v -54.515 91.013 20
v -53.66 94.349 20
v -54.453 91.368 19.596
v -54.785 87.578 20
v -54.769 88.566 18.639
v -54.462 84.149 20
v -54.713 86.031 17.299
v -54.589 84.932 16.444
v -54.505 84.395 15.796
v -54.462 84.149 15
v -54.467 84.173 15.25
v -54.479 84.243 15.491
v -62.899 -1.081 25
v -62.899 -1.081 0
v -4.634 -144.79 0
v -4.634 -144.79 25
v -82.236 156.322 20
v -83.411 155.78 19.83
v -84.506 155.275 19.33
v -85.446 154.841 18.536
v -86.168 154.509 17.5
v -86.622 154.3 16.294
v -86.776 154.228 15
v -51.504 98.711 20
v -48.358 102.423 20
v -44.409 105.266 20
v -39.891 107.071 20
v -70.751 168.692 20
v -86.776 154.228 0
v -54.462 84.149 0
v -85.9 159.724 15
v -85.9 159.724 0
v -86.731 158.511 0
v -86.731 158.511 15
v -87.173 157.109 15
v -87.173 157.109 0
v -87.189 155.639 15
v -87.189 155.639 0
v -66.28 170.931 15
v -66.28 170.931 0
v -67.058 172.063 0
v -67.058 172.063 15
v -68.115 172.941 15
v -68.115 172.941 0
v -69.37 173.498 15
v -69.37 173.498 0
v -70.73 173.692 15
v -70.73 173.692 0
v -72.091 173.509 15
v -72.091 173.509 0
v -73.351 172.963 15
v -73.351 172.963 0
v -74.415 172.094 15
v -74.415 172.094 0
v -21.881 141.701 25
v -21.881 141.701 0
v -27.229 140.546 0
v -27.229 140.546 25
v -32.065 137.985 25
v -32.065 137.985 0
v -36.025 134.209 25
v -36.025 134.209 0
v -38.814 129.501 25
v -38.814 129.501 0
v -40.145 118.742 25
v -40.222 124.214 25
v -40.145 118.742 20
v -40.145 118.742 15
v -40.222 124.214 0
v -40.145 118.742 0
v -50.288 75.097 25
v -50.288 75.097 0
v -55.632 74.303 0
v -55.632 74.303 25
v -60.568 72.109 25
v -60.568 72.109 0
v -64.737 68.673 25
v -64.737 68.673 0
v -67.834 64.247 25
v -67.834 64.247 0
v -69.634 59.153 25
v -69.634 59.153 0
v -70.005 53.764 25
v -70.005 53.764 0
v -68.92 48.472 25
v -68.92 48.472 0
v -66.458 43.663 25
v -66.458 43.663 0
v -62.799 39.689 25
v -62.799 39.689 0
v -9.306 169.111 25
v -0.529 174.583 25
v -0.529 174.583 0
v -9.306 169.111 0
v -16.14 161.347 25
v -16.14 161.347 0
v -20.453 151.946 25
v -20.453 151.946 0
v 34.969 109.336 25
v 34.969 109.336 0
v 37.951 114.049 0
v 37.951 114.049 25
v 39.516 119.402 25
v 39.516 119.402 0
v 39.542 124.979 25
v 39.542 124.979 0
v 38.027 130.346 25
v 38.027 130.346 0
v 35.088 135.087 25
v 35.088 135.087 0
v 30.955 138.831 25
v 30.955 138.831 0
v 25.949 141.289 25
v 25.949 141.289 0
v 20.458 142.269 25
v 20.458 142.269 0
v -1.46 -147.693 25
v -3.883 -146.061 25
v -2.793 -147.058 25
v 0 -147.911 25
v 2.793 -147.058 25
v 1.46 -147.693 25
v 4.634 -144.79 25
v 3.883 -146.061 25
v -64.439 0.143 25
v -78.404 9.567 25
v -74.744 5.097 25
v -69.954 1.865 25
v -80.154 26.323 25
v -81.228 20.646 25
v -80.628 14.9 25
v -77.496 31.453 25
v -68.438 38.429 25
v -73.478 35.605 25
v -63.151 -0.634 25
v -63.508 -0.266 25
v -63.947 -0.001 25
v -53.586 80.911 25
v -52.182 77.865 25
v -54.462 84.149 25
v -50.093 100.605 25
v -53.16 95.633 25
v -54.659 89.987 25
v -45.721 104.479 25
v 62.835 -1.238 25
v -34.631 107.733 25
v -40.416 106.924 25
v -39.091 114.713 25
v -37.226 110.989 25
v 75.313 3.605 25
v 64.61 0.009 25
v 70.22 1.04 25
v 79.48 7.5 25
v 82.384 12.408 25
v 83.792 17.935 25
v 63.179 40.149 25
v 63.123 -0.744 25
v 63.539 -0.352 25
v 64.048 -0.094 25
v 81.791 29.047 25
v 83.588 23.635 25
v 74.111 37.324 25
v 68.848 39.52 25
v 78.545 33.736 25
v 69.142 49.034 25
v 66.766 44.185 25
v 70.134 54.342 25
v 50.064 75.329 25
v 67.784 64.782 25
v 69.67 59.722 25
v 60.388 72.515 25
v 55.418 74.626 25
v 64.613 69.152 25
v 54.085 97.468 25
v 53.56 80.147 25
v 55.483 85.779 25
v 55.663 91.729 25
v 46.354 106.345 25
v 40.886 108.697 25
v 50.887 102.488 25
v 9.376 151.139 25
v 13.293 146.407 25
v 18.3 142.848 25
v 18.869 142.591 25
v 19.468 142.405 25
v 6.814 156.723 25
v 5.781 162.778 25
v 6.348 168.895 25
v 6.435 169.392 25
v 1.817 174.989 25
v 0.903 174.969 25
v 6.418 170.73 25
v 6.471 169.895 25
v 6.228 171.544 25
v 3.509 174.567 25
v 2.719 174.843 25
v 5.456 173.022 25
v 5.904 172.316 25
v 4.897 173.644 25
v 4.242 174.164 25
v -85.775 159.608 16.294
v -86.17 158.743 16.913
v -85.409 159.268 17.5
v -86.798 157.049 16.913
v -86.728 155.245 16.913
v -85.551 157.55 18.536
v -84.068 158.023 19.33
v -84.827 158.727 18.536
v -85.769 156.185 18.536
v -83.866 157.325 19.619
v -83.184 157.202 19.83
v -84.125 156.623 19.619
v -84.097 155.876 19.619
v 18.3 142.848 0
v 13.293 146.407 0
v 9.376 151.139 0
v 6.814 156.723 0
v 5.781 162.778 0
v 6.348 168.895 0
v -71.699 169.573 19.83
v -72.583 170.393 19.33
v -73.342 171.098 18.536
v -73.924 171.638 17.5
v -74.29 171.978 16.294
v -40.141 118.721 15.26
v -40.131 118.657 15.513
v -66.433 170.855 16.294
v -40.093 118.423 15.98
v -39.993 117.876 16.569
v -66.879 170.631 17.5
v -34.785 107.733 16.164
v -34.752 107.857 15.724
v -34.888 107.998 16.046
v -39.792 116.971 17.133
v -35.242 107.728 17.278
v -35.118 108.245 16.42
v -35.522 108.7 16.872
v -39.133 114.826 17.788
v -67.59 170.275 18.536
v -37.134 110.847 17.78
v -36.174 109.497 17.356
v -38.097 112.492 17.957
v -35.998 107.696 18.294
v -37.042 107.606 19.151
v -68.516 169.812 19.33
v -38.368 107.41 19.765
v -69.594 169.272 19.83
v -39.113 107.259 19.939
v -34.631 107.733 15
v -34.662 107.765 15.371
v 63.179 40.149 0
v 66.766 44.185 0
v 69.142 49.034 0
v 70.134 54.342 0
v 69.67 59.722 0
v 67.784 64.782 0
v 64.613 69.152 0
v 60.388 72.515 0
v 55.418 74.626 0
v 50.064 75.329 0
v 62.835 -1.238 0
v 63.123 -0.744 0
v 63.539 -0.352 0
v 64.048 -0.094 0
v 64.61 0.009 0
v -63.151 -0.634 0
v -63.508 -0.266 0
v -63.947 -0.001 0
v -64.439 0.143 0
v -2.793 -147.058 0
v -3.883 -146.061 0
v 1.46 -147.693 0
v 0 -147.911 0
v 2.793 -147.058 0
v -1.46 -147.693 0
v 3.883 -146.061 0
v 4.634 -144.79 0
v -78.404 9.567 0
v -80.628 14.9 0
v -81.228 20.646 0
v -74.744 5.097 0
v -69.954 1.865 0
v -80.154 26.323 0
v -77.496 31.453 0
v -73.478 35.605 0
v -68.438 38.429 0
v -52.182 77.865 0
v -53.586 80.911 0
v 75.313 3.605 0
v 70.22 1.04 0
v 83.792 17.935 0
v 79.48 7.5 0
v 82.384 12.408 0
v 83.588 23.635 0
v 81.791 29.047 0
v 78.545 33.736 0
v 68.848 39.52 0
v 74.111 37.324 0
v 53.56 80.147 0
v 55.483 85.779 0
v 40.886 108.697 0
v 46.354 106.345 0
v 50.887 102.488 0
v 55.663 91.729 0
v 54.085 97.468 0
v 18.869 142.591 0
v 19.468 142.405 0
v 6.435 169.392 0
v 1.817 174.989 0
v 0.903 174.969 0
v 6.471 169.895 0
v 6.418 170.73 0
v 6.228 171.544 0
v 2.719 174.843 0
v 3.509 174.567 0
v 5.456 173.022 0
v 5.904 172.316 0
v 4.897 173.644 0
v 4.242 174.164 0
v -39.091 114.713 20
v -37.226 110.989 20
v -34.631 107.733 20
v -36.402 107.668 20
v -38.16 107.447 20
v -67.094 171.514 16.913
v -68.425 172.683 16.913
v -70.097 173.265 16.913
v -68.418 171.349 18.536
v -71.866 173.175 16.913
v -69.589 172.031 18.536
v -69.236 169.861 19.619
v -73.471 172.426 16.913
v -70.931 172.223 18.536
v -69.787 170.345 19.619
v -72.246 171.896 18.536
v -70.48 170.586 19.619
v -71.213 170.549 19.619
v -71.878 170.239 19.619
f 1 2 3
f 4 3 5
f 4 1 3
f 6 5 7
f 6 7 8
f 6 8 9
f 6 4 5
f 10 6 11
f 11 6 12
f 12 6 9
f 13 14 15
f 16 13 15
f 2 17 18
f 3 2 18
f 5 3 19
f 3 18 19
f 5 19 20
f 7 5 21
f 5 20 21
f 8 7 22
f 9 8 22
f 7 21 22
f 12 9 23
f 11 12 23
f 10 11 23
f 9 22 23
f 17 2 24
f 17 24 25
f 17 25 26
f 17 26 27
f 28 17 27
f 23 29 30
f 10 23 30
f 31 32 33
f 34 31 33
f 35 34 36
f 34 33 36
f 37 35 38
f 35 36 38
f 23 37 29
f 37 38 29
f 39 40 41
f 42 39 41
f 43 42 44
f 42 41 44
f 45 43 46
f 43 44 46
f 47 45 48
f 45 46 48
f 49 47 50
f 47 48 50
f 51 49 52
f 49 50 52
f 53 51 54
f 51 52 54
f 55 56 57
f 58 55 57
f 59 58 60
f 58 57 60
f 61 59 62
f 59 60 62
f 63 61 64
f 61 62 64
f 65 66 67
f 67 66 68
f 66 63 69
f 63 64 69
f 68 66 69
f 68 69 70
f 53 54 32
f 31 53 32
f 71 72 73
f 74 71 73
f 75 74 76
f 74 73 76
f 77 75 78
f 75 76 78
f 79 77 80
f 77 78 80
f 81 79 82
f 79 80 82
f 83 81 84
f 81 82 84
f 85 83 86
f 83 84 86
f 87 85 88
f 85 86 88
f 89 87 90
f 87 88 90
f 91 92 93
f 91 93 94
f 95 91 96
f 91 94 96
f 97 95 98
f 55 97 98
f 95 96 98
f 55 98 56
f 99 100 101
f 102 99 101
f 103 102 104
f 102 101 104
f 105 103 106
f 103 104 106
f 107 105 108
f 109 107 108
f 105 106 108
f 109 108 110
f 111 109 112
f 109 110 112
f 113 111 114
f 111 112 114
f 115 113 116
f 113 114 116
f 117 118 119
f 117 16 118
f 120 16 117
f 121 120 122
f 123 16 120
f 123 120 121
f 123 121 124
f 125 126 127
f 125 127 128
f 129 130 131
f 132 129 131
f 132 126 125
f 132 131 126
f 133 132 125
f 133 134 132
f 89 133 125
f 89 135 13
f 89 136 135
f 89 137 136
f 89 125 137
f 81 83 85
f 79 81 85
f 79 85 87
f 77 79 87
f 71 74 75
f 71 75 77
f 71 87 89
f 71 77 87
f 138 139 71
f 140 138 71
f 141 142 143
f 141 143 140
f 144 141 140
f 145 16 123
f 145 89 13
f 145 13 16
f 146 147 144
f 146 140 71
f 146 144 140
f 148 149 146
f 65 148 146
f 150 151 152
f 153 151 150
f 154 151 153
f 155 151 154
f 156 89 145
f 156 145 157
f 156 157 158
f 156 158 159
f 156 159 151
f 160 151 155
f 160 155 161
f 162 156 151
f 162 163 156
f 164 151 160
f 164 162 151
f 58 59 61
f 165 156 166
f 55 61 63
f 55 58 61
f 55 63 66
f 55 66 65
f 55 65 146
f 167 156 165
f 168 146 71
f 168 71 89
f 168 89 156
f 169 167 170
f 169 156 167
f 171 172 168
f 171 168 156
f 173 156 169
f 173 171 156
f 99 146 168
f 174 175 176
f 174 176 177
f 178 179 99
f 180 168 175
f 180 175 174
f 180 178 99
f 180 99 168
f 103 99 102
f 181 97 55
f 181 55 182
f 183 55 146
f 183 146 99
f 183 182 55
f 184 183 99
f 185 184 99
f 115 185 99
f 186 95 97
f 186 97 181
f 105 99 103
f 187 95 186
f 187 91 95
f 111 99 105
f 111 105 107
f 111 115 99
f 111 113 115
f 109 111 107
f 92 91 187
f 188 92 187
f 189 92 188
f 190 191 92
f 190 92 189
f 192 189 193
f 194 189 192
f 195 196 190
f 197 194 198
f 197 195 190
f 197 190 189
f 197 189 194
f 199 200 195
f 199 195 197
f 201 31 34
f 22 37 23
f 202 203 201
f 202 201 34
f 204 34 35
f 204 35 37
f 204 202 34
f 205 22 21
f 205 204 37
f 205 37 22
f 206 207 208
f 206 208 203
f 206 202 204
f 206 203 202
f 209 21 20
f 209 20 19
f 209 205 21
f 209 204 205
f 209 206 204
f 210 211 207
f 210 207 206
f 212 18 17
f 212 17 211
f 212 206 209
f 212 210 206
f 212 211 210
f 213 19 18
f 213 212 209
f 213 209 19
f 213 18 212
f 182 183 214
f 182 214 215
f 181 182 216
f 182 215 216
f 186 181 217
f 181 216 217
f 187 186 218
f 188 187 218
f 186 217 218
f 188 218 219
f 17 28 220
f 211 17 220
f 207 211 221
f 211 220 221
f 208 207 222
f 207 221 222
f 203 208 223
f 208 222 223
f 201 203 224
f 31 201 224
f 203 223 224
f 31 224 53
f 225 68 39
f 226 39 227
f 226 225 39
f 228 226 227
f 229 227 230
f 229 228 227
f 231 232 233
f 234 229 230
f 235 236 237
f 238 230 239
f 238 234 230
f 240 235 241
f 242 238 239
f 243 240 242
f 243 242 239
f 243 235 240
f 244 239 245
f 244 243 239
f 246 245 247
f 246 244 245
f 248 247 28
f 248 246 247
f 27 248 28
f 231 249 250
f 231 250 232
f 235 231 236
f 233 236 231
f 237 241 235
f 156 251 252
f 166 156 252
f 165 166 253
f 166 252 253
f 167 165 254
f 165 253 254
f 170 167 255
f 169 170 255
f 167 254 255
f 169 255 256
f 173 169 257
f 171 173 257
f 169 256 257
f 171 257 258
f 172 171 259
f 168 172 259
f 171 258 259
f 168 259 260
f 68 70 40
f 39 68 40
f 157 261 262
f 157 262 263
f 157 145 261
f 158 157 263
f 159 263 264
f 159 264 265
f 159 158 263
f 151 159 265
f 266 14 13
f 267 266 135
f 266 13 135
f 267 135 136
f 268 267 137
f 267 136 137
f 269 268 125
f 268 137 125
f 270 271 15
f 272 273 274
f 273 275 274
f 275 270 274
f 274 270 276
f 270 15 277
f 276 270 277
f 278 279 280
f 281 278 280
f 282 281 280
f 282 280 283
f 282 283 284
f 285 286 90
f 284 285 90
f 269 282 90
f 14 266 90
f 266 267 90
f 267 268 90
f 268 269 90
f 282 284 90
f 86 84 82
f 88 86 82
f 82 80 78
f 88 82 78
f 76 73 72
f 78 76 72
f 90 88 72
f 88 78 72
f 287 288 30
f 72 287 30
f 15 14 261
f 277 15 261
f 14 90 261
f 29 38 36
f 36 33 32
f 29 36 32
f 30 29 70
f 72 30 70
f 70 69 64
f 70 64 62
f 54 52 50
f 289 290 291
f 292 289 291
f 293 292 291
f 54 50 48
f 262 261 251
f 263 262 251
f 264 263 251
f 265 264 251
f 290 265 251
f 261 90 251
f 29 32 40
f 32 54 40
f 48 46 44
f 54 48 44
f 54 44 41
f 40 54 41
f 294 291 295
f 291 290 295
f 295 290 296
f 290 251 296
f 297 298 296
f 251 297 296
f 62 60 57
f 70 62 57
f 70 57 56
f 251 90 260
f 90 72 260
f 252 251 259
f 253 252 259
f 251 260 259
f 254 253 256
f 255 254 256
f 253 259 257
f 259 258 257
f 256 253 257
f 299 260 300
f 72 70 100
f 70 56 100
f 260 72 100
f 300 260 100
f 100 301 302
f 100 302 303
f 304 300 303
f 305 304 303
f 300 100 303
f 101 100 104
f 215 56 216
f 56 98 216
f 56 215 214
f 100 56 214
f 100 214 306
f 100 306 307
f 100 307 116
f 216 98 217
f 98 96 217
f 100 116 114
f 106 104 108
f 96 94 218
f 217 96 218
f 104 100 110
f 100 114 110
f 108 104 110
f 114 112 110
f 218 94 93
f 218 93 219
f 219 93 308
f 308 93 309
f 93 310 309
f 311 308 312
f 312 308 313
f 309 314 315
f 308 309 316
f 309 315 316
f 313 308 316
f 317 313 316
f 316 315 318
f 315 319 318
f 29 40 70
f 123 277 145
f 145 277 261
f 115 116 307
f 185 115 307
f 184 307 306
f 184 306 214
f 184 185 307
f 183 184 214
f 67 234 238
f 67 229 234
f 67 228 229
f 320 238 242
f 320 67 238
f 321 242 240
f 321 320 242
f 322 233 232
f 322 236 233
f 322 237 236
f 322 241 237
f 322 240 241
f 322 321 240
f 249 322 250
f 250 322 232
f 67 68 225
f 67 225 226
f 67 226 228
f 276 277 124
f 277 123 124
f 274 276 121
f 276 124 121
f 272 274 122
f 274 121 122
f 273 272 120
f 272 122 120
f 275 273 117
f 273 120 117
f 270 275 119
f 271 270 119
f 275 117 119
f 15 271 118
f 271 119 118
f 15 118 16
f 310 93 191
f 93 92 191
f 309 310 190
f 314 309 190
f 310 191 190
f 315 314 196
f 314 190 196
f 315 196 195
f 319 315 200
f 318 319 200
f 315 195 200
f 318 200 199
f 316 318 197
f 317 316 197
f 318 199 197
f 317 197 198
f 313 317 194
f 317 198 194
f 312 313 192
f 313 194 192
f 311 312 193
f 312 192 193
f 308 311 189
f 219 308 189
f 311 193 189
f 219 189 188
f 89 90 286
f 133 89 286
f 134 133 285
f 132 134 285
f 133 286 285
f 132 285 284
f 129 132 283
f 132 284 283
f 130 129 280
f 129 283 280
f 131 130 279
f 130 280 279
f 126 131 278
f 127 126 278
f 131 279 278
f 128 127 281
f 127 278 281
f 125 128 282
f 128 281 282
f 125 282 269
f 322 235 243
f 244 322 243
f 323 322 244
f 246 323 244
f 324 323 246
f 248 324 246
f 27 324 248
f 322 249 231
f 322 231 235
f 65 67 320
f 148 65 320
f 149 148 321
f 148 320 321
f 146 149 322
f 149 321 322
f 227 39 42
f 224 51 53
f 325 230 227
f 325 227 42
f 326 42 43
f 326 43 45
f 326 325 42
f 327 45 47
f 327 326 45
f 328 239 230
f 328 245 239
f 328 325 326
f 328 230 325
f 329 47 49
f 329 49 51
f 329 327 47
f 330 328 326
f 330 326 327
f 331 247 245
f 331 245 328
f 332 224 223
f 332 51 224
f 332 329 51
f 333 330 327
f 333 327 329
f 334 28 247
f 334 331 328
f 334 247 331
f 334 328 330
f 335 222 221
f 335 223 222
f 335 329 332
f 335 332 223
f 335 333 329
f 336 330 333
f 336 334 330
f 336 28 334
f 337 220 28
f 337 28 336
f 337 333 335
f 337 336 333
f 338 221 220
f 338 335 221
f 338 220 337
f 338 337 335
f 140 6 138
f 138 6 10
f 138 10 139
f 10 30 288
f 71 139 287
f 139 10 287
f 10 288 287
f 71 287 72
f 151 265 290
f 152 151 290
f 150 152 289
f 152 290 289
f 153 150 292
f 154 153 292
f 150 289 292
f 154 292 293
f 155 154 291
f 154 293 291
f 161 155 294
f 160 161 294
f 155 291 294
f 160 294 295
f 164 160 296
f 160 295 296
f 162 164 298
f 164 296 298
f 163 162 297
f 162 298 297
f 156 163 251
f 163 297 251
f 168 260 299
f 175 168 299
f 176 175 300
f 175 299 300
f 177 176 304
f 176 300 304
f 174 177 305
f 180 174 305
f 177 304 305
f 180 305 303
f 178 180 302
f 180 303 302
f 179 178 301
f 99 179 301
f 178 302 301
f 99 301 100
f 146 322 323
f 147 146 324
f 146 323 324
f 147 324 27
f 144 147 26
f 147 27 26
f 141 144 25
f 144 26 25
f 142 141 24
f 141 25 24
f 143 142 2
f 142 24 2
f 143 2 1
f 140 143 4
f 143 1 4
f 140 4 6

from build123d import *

# Parameters (mm, degrees)
F1_DEPTH     = 25
F2_R         = 5
F3_R         = 5
F4_R         = 2
F6_R         = 5
F7_DEPTH     = 20
F8_T1_DEPTH  = 16.879655815
F8_T3_DEPTH  = 23.3726224193
F8_T5_DEPTH  = 33.0268060681
F8_T10_DEPTH = 5.1
F8_T16_DEPTH = 5.1
F8_T22_DEPTH = 98.4210661838
F8_S23_R     = 20
F8_T24_DEPTH = 53
F8_S25_R     = 20
F8_T26_DEPTH = 53
F8_T30_DEPTH = 70.867251183
F8_S31_R     = 20
F8_T32_DEPTH = 39
F8_S33_R     = 20
F8_T34_DEPTH = 39


# Not quite as in the source:
# - a fillet or chamfer that OpenCascade refuses, or shapes differently, is made with other operations: its cross-section is extruded or revolved along the edge and cut away or added
# - two fillets or chamfers of one size are made in one step


with BuildPart() as f1:
    # F0 (on Top) → F1 (new body)
    with BuildSketch(Plane.XY):
        with BuildLine():
            ThreePointArc((-62.7989065684, 39.6886658546), (-81.243248627, 20.090620438), (-63.3367104763, 0))
            Line((-63.3367104763, 0), (0, -156.2183324342))
            Line((0, -156.2183324342), (63.3367104763, 0))
            ThreePointArc((63.3367104763, 0), (83.9060549488, 20.1553189736), (63.1791622356, 40.1485861756))
            ThreePointArc((63.1791622356, 40.1485861756), (68.8985621757, 62.3156526678), (50.0641206725, 75.3292680691))
            ThreePointArc((50.0641206725, 75.3292680691), (54.0847867027, 97.4676528526), (34.9687938538, 109.335788913))
            ThreePointArc((34.9687938538, 109.335788913), (37.8165399559, 130.8078112166), (19.4443891765, 142.2804515145))
            ThreePointArc((19.4443891765, 142.2804515145), (6.5496116272, 157.6455026462), (10.1508991793, 177.3784905672))
            ThreePointArc((10.1508991793, 177.3784905672), (-12.7726518652, 165.7418593556), (-21.8806297798, 141.7013702435))
            ThreePointArc((-21.8806297798, 141.7013702435), (-36.0248561638, 134.2091888045), (-40.144512278, 118.7424387834))
            Line((-40.144512278, 118.7424387834), (-34.6308081302, 107.732548238))
            ThreePointArc((-34.6308081302, 107.732548238), (-50.0933619749, 100.6048777691), (-54.4620472952, 84.1486070408))
            Line((-54.4620472952, 84.1486070408), (-50.2881059675, 75.0966394345))
            ThreePointArc((-50.2881059675, 75.0966394345), (-68.9068668709, 61.7610342158), (-62.7989065684, 39.6886658546))
        make_face()
        with BuildLine():
            Line((-19.4251702535, 141.7357782283), (-21.8806297798, 141.7013702435))
            ThreePointArc((-21.8806297798, 141.7013702435), (-20.6534286134, 141.7562965225), (-19.4251702535, 141.7357782283))
        make_face(mode=Mode.SUBTRACT)
        with BuildLine():
            ThreePointArc((-40.144512278, 118.7424387834), (-38.2560486822, 112.8026084286), (-34.6308081302, 107.732548238))
            Line((-34.6308081302, 107.732548238), (-40.144512278, 118.7424387834))
        make_face()
        with BuildLine():
            ThreePointArc((-54.4620472952, 84.1486070408), (-52.9480489841, 79.3584206811), (-50.2881059675, 75.0966394345))
            Line((-50.2881059675, 75.0966394345), (-54.4620472952, 84.1486070408))
        make_face()
        with BuildLine():
            ThreePointArc((-19.4251702535, 141.7357782283), (-20.6534286134, 141.7562965225), (-21.8806297798, 141.7013702435))
            Line((-21.8806297798, 141.7013702435), (-19.4251702535, 141.7357782283))
        make_face()
    extrude(amount=F1_DEPTH)

    # F2
    f2_edges = [f1.edges().sort_by_distance(p)[0] for p in [
        (10.150899, 177.378491, 12.5),
    ]]
    fillet(f2_edges, radius=F2_R)

    # F3
    f3_edges = [f1.edges().sort_by_distance(p)[0] for p in [
        (0, -156.218332, 12.5),
    ]]
    fillet(f3_edges, radius=F3_R)

    # F4
    f4_edges = [f1.edges().sort_by_distance(p)[0] for p in [
        (63.33671, 0, 12.5),
        (-63.33671, 0, 12.5),
    ]]
    fillet(f4_edges, radius=F4_R)

    # F6
    f6_edges = [f1.edges().sort_by_distance(p)[0] for p in [
        (19.444389, 142.280452, 12.5),
    ]]
    fillet(f6_edges, radius=F6_R)

    # F0 (on Top) → F7 (join)
    with BuildSketch(Plane.XY):
        with BuildLine():
            Line((-88.1787538528, 157.26955235), (-54.4620472952, 84.1486070408))
            ThreePointArc((-54.4620472952, 84.1486070408), (-50.0933619749, 100.6048777691), (-34.6308081302, 107.732548238))
            ThreePointArc((-34.6308081302, 107.732548238), (-38.2560486822, 112.8026084286), (-40.144512278, 118.7424387834))
            Line((-40.144512278, 118.7424387834), (-69.5091858506, 177.3784905672))
            Line((-69.5091858506, 177.3784905672), (-88.1787538528, 157.26955235))
        make_face()
    extrude(amount=F7_DEPTH)

    # F8: fillet of radius 5 on 5 edges, made by hand

    # F8_s2 → F8_t1 (cut)
    with BuildSketch(Plane(origin=(51.3609651153, 55.3207484048, 0), x_dir=(0, 0, 1), z_dir=(-0.6803920453, -0.7328483231, 0))):
        with BuildLine():
            ThreePointArc((20, 166.626604285), (18.5355339059, 170.1621381909), (15, 171.626604285))
            Line((15, 171.626604285), (20, 171.626604285))
            Line((20, 171.626604285), (20, 166.626604285))
        make_face()
    extrude(amount=F8_T1_DEPTH, mode=Mode.SUBTRACT)

    # F8_s4 → F8_t3 (cut)
    with BuildSketch(Plane.XY.offset(-8.3726224193)):
        with BuildLine():
            ThreePointArc((-85.9000875758, 159.72389727), (-87.1734696665, 157.1092566329), (-86.7763850028, 154.2282548314))
            Line((-86.7763850028, 154.2282548314), (-88.1787538528, 157.26955235))
            Line((-88.1787538528, 157.26955235), (-85.9000875758, 159.72389727))
        make_face()
    extrude(amount=F8_T3_DEPTH, mode=Mode.SUBTRACT)

    # F8_s6 → F8_t5 (cut)
    with BuildSketch(Plane.XY.offset(-18.0268060681)):
        with BuildLine():
            ThreePointArc((-66.280350029, 170.9310773526), (-70.0434123782, 173.6418343313), (-74.4153040312, 172.0941247282))
            Line((-74.4153040312, 172.0941247282), (-69.5091858506, 177.3784905672))
            Line((-69.5091858506, 177.3784905672), (-66.280350029, 170.9310773526))
        make_face()
    extrude(amount=F8_T5_DEPTH, mode=Mode.SUBTRACT)


with BuildPart() as f8_tool8:
    # F8_s9 → F8_t10 (new body)
    with BuildSketch(Plane.XY.offset(15)):
        Polygon((-82.2358459604, 156.3219370433), (-85.9733724081, 159.7919364745), (-88.2976120107, 157.2885046562), (-86.8671957836, 154.1863811872), align=None)
    extrude(amount=F8_T10_DEPTH)

    # F8_s11 → F8_t12 (revolve, cut)
    with BuildSketch(Plane(origin=(-82.2358459604, 156.3219370433, 15), x_dir=(0.9875247412, -0.1574639179, 0), z_dir=(-0.1574639179, -0.9875247412, 0))):
        with BuildLine():
            ThreePointArc((0, -5), (5, 0), (0, 5))
            Line((0, 5), (0, -5))
        make_face()
    revolve(axis=Axis((-82.2358459604, 156.3219370433, 15), (0, 0, 1)), mode=Mode.SUBTRACT)


with BuildPart() as f1_1:
    add(f1.part)

    # F8_t7: cut F8_tool8
    add(f8_tool8.part, mode=Mode.SUBTRACT)


with BuildPart() as f8_tool14:
    # F8_s15 → F8_t16 (new body)
    with BuildSketch(Plane.XY.offset(15)):
        Polygon((-70.7510624158, 168.6921645015), (-74.4885888636, 172.1621639327), (-69.4843483193, 177.5522170885), (-66.1909357813, 170.9758556096), align=None)
    extrude(amount=F8_T16_DEPTH)

    # F8_s17 → F8_t18 (revolve, cut)
    with BuildSketch(Plane(origin=(-70.7510624158, 168.6921645015, 15), x_dir=(-0.1415300075, -0.989933966, 0), z_dir=(-0.989933966, 0.1415300075, 0))):
        with BuildLine():
            ThreePointArc((0, -5), (5, 0), (0, 5))
            Line((0, 5), (0, -5))
        make_face()
    revolve(axis=Axis((-70.7510624158, 168.6921645015, 15), (0, 0, 1)), mode=Mode.SUBTRACT)


with BuildPart() as f1_2:
    add(f1_1.part)

    # F8_t13: cut F8_tool14
    add(f8_tool14.part, mode=Mode.SUBTRACT)


with BuildPart() as f8_tool20:
    # F8_s21 → F8_t22 (new body)
    with BuildSketch(Plane(origin=(-73.8618913818, 160.1832406418, 0), x_dir=(0, 0, 1), z_dir=(0.4187364424, -0.9081078085, 0))):
        with BuildLine():
            ThreePointArc((20, 9.2213220725), (18.5355339059, 12.7568559784), (15, 14.2213220725))
            Line((15, 14.2213220725), (20, 14.2213220725))
            Line((20, 14.2213220725), (20, 9.2213220725))
        make_face()
    extrude(amount=F8_T22_DEPTH)

    # F8_s23 → F8_t24 (cut, symmetric)
    with BuildSketch(Plane.XY.offset(17.5)):
        with Locations((-34.7858928144, 87.7331495285)):
            Circle(F8_S23_R)
    extrude(amount=F8_T24_DEPTH, both=True, mode=Mode.SUBTRACT)

    # F8_s25 → F8_t26 (cut, symmetric)
    with BuildSketch(Plane.XY.offset(17.5)):
        with Locations((-50.049379468, 55.0980642438)):
            Circle(F8_S25_R)
    extrude(amount=F8_T26_DEPTH, both=True, mode=Mode.SUBTRACT)


with BuildPart() as f1_3:
    add(f1_2.part)

    # F8_t19: cut F8_tool20
    add(f8_tool20.part, mode=Mode.SUBTRACT)


with BuildPart() as f8_tool28:
    # F8_s29 → F8_t30 (new body)
    with BuildSketch(Plane(origin=(-49.9943289817, 99.8298195219, 0), x_dir=(0, 0, 1), z_dir=(-0.4477825702, 0.8941424774, 0))):
        with BuildLine():
            ThreePointArc((15, 17.2758807713), (18.5355339059, 15.8114146772), (20, 12.2758807713))
            Line((20, 12.2758807713), (20, 17.2758807713))
            Line((20, 17.2758807713), (15, 17.2758807713))
        make_face()
    extrude(amount=F8_T30_DEPTH)

    # F8_s31 → F8_t32 (cut, symmetric)
    with BuildSketch(Plane.XY.offset(17.5)):
        with Locations((-20.3731991351, 121.7582598329)):
            Circle(F8_S31_R)
    extrude(amount=F8_T32_DEPTH, both=True, mode=Mode.SUBTRACT)

    # F8_s33 → F8_t34 (cut, symmetric)
    with BuildSketch(Plane.XY.offset(17.5)):
        with Locations((-34.7858928144, 87.7331495285)):
            Circle(F8_S33_R)
    extrude(amount=F8_T34_DEPTH, both=True, mode=Mode.SUBTRACT)


with BuildPart() as f1_4:
    add(f1_3.part)

    # F8_t27: cut F8_tool28
    add(f8_tool28.part, mode=Mode.SUBTRACT)


solid = f1_4.part
